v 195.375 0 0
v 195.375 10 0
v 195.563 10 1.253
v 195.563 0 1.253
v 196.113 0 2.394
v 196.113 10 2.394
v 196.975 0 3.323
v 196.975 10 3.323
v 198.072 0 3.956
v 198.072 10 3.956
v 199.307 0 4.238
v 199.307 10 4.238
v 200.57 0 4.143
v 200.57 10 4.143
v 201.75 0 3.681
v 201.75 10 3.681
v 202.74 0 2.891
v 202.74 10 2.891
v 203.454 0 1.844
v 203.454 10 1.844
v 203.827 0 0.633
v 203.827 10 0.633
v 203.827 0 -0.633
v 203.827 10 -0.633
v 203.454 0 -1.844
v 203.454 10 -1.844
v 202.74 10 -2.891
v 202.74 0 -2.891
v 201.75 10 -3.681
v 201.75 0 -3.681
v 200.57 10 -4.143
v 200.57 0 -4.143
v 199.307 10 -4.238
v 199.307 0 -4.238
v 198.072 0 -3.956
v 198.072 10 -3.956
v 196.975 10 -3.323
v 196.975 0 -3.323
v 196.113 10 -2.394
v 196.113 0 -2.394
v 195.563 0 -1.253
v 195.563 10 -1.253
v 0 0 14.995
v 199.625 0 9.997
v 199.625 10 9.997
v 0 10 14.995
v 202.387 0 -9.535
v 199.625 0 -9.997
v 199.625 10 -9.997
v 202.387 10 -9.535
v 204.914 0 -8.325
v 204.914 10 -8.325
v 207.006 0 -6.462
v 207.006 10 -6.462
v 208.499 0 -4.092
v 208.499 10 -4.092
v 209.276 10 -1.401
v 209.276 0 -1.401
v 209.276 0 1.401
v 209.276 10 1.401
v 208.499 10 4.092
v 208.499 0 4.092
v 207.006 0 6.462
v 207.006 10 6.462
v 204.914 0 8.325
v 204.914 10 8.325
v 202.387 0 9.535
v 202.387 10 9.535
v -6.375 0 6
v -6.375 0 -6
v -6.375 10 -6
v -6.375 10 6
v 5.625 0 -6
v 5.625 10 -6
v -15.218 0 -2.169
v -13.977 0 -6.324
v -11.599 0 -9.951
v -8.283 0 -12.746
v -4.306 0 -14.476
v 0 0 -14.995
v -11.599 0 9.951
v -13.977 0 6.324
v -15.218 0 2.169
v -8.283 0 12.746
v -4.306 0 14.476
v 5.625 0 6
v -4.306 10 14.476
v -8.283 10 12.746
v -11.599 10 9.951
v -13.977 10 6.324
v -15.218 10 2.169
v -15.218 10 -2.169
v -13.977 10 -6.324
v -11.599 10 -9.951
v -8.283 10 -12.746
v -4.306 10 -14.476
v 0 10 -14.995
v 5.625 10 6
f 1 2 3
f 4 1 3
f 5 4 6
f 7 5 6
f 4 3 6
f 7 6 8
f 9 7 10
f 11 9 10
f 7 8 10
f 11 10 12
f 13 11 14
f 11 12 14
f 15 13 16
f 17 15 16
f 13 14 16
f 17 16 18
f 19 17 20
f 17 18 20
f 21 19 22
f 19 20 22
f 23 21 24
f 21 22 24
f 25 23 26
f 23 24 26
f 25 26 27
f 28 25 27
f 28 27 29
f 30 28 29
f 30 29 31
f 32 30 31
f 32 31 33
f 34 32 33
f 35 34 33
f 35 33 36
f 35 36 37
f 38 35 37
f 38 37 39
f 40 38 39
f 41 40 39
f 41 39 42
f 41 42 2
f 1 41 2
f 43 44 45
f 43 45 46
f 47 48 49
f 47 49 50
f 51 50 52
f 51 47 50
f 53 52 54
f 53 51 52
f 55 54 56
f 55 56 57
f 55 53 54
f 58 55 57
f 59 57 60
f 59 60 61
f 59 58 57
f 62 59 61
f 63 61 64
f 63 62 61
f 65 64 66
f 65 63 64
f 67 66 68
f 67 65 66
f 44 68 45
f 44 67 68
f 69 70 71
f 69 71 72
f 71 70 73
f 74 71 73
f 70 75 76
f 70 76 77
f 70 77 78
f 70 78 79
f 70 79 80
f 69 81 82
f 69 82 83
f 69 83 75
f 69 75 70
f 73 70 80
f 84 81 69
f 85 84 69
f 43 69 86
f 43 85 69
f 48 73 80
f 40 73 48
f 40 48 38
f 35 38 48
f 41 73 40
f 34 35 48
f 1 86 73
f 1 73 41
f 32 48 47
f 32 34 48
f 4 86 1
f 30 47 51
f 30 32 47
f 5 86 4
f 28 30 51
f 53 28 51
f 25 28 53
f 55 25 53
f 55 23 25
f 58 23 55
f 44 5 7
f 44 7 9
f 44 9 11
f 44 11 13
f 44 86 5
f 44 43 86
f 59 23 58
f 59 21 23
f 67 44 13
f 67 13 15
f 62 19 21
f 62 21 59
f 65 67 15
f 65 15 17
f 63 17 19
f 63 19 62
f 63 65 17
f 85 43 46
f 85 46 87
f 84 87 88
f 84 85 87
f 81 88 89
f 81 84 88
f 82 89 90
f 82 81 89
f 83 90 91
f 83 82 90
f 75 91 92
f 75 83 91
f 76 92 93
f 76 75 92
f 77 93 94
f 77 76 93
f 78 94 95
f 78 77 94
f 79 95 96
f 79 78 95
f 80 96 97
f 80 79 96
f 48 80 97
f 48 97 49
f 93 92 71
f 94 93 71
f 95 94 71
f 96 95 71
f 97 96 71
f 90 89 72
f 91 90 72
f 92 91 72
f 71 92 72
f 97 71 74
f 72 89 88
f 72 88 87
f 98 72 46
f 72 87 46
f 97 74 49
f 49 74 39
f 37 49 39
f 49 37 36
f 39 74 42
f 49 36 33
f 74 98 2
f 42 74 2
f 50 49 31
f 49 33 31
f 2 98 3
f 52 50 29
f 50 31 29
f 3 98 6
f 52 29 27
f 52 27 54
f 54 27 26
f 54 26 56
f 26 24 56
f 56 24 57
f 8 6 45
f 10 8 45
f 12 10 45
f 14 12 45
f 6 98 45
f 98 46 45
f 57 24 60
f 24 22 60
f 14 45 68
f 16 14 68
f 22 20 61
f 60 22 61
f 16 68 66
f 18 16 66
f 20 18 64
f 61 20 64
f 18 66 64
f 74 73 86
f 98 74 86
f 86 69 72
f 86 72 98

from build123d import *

# Parameters (mm, degrees)
F0_W     = 12
F0_H     = 12
F1_DEPTH = 10
F2_D     = 8.5
F2_DEPTH = 16.5
F2_TIP   = 2.5536576309


with BuildPart() as f1:
    # F0 (on Front) → F1 (new body)
    with BuildSketch(Plane.XZ):
        with BuildLine():
            Line((199.6245300745, 9.9968666721), (0, 14.9953000082))
            ThreePointArc((0, 14.9953000082), (-15.3754699255, 0), (0, -14.9953000082))
            Line((0, -14.9953000082), (199.6245300745, -9.9968666721))
            ThreePointArc((199.6245300745, -9.9968666721), (209.3742167908, 0), (199.6245300745, 9.9968666721))
        make_face()
        with Locations((-0.3754699255, 0)):
            Rectangle(F0_W, F0_H, mode=Mode.SUBTRACT)
    extrude(amount=-F1_DEPTH)

    # F2
    with Locations(Plane.XZ):
        with Locations((199.6245300745, 0)):
            Hole(F2_D / 2, depth=F2_DEPTH)
            with Locations((0, 0, -(F2_DEPTH + F2_TIP / 2))):  # 118° drill point
                Cone(0, F2_D / 2, F2_TIP, mode=Mode.SUBTRACT)


solid = f1.part
